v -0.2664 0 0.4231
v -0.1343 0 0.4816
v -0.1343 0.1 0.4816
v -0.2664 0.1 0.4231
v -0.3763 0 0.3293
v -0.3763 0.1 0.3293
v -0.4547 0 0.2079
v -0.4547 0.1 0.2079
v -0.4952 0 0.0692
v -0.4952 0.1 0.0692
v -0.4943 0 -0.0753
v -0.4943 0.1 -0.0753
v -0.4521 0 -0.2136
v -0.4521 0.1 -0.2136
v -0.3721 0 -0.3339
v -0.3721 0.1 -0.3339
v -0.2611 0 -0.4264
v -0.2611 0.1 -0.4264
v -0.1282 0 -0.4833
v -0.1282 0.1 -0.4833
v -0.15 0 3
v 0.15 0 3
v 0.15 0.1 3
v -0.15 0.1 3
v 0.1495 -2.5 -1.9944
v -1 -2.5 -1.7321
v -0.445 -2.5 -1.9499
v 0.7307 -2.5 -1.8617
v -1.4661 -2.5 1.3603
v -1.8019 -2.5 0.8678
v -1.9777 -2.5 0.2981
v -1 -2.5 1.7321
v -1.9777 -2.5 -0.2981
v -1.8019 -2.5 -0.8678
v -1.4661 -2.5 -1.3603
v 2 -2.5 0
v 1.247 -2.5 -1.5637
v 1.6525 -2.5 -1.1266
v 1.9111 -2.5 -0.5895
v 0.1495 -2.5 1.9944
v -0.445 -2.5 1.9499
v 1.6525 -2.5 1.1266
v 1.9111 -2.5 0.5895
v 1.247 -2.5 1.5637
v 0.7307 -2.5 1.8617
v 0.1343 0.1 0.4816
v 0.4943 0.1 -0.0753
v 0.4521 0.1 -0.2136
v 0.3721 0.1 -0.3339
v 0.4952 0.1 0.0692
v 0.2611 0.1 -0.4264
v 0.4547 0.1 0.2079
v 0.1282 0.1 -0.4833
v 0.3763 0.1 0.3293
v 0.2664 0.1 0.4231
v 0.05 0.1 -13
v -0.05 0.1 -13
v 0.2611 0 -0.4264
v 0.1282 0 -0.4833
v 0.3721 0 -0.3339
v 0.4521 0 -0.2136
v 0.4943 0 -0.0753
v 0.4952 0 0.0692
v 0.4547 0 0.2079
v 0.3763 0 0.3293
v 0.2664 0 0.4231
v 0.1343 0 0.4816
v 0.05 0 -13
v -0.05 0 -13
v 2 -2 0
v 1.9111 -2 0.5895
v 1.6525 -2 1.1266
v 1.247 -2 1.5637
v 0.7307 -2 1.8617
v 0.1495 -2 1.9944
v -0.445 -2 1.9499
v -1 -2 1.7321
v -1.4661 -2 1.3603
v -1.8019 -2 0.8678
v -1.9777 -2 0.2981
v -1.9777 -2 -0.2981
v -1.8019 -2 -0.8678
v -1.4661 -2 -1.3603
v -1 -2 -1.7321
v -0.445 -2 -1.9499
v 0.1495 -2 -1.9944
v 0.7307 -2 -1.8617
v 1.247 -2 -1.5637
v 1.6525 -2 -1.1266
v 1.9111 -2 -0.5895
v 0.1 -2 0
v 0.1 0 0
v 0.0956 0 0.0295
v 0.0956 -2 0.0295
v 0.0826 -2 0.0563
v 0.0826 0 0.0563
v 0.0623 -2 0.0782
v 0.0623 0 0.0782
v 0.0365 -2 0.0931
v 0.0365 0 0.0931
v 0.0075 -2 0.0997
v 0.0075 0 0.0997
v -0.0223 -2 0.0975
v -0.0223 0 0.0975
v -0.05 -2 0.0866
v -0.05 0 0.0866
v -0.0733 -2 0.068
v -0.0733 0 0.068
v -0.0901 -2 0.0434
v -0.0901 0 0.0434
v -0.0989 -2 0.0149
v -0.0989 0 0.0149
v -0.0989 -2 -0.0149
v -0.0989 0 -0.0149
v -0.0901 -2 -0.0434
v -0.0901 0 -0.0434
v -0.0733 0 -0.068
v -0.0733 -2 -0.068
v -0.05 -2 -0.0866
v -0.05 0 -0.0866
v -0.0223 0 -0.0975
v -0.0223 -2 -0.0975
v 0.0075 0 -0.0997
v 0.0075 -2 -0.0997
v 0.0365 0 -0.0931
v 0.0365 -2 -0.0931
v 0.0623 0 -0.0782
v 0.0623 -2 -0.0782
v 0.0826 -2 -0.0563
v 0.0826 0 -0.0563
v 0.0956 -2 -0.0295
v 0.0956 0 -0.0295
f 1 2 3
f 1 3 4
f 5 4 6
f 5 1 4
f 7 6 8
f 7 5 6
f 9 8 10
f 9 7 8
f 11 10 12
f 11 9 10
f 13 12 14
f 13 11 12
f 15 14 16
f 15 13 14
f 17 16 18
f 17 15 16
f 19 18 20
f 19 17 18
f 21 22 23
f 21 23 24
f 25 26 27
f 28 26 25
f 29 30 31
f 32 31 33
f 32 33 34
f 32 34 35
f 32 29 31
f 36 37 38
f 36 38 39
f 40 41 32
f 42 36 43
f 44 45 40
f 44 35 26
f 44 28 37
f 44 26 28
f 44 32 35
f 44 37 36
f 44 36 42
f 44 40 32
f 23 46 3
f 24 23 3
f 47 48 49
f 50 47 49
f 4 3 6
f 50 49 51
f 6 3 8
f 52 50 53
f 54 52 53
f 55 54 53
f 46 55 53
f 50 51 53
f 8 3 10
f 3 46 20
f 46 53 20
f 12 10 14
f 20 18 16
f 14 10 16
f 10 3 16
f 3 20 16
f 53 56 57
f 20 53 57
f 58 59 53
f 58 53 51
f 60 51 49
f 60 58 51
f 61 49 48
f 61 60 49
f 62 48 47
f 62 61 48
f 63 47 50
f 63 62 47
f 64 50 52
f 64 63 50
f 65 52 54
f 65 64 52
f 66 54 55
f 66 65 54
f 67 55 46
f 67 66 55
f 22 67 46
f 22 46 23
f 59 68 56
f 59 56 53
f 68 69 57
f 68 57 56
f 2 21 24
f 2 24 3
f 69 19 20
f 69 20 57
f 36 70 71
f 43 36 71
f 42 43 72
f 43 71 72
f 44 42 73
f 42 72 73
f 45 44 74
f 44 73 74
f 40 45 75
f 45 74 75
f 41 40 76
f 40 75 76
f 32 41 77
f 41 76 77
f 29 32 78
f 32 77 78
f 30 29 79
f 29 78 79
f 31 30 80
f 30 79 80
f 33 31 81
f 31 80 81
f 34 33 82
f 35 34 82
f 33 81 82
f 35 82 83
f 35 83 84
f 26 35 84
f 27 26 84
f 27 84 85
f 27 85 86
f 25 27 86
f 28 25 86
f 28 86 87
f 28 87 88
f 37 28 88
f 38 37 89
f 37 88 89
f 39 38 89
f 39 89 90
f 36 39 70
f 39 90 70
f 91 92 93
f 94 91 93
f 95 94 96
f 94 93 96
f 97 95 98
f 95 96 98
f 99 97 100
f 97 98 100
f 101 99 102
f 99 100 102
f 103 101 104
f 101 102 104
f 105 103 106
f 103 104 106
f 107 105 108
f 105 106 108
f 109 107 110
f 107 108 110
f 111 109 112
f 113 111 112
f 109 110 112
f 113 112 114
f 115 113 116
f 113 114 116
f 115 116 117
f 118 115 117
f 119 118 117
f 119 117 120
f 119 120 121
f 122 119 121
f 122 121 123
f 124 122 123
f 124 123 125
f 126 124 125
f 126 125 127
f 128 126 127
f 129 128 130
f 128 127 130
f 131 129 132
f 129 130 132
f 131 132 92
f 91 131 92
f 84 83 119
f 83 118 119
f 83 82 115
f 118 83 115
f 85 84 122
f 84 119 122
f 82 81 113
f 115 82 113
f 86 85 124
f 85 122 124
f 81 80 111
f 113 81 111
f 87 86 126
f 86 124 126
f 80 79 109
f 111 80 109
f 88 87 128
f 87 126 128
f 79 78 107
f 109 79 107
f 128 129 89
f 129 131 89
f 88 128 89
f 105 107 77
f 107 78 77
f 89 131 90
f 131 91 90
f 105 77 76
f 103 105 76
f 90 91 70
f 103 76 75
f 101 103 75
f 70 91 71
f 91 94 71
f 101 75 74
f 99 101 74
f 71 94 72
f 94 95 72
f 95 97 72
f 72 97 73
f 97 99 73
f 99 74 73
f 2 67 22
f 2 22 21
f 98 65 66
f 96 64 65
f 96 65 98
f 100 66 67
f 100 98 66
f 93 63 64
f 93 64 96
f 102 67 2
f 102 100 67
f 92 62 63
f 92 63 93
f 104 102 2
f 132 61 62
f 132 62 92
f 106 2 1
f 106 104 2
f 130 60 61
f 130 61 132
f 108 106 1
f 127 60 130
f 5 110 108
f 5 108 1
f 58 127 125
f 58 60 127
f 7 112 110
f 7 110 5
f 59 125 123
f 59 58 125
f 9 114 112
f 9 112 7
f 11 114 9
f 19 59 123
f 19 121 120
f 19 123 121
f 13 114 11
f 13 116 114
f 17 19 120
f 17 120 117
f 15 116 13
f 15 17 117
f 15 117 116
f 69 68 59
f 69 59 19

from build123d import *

# Parameters (mm, degrees)
BOSS_EXTRUDE1_DEPTH = 0.1
SKETCH2_R           = 0.1
BOSS_EXTRUDE2_DEPTH = 2
SKETCH3_R           = 2
BOSS_EXTRUDE3_DEPTH = 0.5


with BuildPart() as part:
    # Sketch1 → Boss-Extrude1 (new body)
    with BuildSketch(Plane(origin=(0, 0, 0), x_dir=(1, 0, 0), z_dir=(0, 1, 0))):
        with BuildLine():
            Line((-0.128229515, 0.483277551), (-0.05, 13))
            Line((-0.05, 13), (0.05, 13))
            Line((0.05, 13), (0.128229515, 0.483277551))
            ThreePointArc((0.128229515, 0.483277551), (0.499990235, 0.003124939), (0.134260231, -0.48163699))
            Line((0.134260231, -0.48163699), (0.15, -3))
            Line((0.15, -3), (-0.15, -3))
            Line((-0.15, -3), (-0.134260231, -0.48163699))
            ThreePointArc((-0.134260231, -0.48163699), (-0.499990235, 0.003124939), (-0.128229515, 0.483277551))
        make_face()
    extrude(amount=BOSS_EXTRUDE1_DEPTH)

    # Sketch2 → Boss-Extrude2 (add)
    with BuildSketch(Plane.XZ):
        Circle(SKETCH2_R)
    extrude(amount=BOSS_EXTRUDE2_DEPTH)

    # Sketch3 → Boss-Extrude3 (add)
    with BuildSketch(Plane.XZ.offset(2)):
        Circle(SKETCH3_R)
    extrude(amount=BOSS_EXTRUDE3_DEPTH)


solid = part.part
